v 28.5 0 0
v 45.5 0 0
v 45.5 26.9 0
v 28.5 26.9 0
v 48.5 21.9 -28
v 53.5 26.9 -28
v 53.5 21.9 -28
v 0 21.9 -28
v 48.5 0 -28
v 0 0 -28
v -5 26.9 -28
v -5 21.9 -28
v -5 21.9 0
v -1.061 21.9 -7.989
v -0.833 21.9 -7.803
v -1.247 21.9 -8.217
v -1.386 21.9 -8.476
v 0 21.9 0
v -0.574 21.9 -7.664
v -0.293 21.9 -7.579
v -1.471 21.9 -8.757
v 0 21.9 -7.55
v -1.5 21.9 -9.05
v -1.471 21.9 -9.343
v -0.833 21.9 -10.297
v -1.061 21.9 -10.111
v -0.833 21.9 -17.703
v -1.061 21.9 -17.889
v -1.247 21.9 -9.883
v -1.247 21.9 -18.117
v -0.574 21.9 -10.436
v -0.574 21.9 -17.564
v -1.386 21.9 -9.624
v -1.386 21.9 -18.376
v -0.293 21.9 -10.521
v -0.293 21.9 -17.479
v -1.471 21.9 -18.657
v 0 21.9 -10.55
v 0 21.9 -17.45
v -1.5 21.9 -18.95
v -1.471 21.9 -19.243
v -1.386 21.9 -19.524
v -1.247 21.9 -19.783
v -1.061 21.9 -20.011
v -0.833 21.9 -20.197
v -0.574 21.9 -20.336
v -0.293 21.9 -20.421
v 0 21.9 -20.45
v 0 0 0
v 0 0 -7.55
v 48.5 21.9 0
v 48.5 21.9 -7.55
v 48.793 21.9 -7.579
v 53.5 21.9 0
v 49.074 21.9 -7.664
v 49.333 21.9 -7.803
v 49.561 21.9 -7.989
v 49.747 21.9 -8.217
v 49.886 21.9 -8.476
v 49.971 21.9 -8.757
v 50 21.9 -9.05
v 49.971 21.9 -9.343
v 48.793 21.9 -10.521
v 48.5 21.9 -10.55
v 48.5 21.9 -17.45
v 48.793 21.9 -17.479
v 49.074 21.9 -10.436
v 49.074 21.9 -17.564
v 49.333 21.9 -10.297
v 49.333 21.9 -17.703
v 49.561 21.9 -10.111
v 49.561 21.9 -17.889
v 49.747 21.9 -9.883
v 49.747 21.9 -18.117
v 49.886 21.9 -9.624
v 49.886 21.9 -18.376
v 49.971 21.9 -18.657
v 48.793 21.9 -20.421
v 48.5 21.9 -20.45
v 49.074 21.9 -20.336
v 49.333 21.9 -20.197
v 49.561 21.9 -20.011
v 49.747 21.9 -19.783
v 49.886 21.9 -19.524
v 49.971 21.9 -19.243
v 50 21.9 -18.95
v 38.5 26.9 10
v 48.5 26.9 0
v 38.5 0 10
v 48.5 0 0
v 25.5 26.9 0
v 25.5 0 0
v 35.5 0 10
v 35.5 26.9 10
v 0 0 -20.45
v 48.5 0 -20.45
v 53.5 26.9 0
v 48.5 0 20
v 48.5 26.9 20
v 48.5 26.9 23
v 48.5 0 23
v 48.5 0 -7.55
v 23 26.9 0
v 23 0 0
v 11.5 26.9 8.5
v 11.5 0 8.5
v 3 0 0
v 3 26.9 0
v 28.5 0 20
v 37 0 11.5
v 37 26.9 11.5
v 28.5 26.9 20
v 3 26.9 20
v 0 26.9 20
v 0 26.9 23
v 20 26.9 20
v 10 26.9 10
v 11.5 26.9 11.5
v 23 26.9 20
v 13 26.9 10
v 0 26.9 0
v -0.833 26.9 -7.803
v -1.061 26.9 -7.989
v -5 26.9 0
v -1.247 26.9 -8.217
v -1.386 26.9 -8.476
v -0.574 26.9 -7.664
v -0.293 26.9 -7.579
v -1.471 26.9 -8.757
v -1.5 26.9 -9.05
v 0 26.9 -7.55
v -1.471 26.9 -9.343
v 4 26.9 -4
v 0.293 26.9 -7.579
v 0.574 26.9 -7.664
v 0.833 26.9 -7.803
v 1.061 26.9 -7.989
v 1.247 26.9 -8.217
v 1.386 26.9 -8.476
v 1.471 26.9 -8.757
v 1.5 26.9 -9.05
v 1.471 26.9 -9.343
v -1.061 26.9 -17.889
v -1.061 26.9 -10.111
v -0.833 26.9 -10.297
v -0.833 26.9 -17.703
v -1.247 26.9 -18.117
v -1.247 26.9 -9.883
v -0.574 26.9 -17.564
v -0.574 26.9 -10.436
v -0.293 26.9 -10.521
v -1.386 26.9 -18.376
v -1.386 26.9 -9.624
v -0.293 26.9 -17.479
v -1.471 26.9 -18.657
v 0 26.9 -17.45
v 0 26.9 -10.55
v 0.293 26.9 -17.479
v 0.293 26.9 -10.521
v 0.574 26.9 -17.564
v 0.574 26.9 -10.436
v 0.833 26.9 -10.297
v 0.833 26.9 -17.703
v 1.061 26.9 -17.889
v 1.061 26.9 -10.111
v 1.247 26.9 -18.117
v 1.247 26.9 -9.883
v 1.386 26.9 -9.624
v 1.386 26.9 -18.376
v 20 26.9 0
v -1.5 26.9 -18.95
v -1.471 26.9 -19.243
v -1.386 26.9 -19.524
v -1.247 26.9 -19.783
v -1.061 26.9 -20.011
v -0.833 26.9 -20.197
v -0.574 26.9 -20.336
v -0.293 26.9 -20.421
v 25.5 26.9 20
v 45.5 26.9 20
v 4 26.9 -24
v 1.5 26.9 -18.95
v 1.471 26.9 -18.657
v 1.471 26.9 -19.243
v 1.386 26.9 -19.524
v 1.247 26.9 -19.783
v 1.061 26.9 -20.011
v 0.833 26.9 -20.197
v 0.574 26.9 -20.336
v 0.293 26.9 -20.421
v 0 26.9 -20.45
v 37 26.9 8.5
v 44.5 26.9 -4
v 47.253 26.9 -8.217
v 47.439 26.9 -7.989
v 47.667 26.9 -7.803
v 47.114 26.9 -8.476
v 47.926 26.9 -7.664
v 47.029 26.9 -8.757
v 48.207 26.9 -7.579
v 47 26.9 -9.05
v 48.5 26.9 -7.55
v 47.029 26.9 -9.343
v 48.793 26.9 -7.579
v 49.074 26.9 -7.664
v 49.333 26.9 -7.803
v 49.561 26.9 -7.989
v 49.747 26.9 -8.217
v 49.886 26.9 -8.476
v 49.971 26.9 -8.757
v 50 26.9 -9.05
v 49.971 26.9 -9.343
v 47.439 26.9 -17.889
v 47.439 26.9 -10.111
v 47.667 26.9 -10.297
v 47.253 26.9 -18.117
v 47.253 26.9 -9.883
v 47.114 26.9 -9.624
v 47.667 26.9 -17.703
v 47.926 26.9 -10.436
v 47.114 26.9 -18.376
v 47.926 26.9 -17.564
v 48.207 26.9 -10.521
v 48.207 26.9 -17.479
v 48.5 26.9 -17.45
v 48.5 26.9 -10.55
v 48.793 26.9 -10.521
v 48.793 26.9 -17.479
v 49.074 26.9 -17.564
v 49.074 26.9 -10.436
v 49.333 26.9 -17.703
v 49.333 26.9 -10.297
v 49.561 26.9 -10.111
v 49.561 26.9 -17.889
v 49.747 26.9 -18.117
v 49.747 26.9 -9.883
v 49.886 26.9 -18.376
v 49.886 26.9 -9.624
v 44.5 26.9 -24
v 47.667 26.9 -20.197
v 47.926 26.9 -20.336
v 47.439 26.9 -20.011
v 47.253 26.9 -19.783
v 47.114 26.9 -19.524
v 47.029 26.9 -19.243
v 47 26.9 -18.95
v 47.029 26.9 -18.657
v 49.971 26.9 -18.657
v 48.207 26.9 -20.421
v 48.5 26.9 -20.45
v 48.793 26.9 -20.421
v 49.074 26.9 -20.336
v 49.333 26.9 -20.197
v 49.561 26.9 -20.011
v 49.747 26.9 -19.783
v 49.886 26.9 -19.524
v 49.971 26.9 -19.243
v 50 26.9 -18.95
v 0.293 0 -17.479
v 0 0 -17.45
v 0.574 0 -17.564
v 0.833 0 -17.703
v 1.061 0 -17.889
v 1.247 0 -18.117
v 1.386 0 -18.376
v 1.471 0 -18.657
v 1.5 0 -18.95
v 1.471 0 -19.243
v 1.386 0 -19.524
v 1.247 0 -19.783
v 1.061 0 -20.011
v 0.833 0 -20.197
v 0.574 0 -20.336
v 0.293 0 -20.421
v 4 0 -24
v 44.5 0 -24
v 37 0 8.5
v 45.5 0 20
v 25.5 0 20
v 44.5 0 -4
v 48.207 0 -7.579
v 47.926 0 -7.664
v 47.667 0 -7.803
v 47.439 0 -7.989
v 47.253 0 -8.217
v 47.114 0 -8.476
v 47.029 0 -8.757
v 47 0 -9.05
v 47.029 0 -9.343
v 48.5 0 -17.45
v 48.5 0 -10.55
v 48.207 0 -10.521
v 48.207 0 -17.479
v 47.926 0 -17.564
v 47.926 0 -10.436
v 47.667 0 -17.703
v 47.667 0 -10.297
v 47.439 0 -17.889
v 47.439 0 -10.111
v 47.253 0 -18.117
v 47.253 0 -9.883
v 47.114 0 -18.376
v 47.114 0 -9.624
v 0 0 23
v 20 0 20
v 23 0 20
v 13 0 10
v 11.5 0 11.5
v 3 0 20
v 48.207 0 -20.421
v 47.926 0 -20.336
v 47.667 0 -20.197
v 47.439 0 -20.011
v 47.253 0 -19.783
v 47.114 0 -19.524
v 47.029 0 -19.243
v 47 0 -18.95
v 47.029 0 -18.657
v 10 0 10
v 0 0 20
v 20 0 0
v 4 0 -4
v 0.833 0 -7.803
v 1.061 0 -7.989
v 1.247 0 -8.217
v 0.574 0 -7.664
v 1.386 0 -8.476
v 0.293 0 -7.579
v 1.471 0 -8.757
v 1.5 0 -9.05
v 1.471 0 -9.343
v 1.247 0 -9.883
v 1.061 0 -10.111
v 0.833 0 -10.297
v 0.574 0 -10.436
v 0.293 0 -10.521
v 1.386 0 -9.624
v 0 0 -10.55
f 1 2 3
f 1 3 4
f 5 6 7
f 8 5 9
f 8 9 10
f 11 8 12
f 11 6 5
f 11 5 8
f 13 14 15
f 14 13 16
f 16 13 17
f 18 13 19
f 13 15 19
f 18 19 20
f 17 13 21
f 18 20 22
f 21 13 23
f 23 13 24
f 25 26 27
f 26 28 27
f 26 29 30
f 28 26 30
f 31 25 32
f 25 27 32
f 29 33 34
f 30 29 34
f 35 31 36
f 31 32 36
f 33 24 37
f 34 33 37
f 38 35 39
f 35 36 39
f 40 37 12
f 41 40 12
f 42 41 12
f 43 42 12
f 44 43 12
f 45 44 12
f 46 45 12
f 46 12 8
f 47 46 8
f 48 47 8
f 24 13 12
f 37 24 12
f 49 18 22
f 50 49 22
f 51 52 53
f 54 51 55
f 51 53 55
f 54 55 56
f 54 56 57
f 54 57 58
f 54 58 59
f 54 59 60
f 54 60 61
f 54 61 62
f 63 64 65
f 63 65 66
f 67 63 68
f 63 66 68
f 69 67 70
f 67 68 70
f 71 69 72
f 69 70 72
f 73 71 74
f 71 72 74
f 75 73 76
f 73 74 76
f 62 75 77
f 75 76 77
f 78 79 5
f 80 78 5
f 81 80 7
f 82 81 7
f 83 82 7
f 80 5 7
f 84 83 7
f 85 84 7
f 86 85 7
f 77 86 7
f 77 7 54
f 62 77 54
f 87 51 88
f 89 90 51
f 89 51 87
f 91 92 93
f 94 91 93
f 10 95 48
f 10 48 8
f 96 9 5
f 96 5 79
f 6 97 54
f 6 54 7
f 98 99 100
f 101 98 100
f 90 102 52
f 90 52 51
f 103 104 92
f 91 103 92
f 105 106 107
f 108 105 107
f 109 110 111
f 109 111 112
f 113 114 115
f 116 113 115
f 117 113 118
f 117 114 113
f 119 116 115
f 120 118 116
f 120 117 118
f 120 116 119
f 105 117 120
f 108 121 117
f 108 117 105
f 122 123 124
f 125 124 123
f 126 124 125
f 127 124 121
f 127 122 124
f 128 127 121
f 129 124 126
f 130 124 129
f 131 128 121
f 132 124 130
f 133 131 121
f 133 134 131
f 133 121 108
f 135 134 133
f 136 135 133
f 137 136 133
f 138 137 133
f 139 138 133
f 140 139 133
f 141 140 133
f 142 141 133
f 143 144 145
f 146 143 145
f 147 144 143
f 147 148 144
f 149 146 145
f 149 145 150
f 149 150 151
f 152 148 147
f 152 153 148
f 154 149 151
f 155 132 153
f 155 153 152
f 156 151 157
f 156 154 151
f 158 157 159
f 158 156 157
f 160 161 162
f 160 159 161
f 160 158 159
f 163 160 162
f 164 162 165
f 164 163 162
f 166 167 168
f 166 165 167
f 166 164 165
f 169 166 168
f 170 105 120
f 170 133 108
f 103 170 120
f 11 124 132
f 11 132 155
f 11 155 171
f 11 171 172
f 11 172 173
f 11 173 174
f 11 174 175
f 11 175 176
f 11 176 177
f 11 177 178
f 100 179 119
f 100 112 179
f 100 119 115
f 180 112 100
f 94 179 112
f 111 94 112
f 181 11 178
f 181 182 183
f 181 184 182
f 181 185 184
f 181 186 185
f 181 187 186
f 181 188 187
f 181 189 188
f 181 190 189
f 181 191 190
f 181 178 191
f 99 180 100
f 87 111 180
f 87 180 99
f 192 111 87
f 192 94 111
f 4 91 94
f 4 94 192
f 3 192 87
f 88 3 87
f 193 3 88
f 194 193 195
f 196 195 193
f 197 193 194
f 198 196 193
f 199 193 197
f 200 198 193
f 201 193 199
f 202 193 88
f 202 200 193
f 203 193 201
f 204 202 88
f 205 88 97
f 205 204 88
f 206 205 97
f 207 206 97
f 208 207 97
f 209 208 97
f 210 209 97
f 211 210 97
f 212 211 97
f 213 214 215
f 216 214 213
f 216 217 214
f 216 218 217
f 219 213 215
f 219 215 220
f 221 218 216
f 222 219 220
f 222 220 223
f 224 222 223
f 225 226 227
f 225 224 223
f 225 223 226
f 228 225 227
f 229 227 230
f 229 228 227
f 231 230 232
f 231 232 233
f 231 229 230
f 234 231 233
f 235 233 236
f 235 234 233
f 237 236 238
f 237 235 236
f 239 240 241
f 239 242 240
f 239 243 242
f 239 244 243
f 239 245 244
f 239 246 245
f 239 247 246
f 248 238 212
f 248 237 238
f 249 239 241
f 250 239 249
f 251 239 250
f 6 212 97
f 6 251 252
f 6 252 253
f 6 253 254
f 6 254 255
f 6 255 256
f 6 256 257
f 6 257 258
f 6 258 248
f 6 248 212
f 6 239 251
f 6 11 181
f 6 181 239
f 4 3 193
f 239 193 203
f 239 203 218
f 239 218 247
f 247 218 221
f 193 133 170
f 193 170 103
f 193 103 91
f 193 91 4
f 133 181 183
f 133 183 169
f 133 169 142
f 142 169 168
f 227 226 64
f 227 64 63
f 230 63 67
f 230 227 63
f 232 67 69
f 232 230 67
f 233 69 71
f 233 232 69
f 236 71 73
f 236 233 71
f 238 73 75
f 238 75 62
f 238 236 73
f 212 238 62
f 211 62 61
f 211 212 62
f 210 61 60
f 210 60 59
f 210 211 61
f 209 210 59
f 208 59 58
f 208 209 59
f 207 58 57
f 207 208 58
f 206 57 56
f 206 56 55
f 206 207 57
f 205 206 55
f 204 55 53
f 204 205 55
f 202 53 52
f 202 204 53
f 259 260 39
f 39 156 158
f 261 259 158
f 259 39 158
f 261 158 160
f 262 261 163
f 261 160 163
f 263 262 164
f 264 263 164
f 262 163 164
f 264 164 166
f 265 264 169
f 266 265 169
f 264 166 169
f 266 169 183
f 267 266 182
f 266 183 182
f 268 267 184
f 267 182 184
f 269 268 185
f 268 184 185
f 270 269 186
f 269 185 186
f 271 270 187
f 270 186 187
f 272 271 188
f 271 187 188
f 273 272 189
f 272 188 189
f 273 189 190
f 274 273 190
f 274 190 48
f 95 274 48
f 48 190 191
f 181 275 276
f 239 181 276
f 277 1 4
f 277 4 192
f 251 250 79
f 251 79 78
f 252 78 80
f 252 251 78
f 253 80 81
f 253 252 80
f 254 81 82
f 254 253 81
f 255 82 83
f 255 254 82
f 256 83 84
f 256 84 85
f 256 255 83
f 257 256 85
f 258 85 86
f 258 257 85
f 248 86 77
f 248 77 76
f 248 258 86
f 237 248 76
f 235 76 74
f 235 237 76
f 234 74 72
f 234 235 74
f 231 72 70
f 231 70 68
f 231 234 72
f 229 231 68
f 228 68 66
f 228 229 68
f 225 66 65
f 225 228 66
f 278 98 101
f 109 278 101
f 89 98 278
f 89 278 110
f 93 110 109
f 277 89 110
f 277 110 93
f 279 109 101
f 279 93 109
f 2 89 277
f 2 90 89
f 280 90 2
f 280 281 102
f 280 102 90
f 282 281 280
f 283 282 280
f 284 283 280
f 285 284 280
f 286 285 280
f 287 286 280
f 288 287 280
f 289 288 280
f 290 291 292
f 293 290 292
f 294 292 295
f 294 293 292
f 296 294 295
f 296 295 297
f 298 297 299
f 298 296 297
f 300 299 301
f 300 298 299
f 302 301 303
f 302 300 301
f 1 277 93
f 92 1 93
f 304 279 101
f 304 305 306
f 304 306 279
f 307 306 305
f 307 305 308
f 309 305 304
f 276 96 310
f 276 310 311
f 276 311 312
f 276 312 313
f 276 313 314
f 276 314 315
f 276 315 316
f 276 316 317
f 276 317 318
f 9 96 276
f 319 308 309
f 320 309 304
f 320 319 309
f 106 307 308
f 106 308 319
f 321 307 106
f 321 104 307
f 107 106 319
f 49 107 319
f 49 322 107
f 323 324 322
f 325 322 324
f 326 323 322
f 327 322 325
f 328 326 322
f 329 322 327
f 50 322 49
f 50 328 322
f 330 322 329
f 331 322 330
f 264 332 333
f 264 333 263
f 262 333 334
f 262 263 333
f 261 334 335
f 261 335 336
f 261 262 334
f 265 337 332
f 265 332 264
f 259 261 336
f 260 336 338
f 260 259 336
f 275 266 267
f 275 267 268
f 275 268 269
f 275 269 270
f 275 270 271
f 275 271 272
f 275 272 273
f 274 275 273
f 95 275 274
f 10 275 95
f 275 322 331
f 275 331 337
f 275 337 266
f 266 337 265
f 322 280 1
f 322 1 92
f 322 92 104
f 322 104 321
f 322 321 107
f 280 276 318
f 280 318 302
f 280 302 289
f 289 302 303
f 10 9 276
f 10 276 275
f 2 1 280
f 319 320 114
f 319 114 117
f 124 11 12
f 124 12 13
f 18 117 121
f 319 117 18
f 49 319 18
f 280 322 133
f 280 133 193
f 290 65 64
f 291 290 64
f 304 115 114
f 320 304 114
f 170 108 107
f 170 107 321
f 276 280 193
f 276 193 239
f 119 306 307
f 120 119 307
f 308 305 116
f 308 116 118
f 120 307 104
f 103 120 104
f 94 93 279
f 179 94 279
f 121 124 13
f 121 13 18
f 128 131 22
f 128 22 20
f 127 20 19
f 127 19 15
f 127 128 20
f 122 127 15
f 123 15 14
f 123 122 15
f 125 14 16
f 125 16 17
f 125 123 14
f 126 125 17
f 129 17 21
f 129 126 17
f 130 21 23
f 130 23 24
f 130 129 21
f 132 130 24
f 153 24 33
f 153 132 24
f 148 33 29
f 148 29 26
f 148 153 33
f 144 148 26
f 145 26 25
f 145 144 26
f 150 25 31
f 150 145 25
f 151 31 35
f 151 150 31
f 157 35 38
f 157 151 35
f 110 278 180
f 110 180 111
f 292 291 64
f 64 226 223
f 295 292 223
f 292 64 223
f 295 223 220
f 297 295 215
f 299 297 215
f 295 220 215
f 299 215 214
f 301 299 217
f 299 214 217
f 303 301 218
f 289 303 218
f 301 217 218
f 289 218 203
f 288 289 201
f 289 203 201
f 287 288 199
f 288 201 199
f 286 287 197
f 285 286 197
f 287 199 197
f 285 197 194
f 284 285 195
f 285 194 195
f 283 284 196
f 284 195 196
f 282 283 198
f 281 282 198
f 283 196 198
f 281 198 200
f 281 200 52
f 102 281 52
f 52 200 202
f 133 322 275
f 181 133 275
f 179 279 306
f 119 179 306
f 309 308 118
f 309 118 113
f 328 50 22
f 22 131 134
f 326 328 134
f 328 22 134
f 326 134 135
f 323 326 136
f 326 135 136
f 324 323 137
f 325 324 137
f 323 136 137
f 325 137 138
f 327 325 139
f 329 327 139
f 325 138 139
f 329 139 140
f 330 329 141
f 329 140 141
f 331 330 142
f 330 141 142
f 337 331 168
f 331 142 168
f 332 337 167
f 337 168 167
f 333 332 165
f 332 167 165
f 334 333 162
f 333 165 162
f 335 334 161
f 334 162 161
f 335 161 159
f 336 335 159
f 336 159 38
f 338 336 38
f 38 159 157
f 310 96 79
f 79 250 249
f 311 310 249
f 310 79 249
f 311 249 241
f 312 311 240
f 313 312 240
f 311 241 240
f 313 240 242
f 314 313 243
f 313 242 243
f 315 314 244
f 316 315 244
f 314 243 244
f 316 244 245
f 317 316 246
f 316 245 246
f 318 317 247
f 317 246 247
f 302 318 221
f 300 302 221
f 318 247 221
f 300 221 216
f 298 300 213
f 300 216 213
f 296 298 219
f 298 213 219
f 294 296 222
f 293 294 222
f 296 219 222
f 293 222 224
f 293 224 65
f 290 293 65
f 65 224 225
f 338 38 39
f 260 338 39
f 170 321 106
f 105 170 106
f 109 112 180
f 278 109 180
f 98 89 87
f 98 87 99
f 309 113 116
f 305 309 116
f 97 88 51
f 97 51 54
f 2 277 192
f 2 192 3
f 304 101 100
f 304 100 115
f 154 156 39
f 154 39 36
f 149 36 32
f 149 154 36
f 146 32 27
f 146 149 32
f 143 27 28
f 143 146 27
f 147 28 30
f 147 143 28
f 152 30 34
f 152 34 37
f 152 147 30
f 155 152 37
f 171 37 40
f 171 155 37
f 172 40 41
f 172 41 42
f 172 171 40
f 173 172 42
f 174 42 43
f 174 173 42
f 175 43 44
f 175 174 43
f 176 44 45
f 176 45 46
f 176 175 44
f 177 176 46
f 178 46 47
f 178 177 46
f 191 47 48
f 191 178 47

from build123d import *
from build123d.topology import SkipClean

# Parameters (mm, degrees)
SKETCH1_W           = 40.5
SKETCH1_H           = 20
BOSS_EXTRUDE1_DEPTH = 26.9
BOSS_EXTRUDE2_DEPTH = 5
SKETCH3_R           = 1.5
CUT_EXTRUDE1_DEPTH  = 67.10491661


with BuildPart() as part:
    # Sketch1 → Boss-Extrude1 (new body)
    with BuildSketch(Plane(origin=(0, 0, 0), x_dir=(1, 0, 0), z_dir=(0, 1, 0))):
        Polygon((0, 0), (0, 28), (48.5, 28), (48.5, 0), (38.5, -10), (48.5, -20), (48.5, -23), (0, -23), (0, -20), (10, -10), align=None)
        with Locations((24.25, 14)):
            Rectangle(SKETCH1_W, SKETCH1_H, mode=Mode.SUBTRACT)
        Polygon((3, 0), (20, 0), (11.5, -8.5), align=None, mode=Mode.SUBTRACT)
        Polygon((13, -10), (23, 0), (25.5, 0), (35.5, -10), (25.5, -20), (23, -20), align=None, mode=Mode.SUBTRACT)
        Polygon((11.5, -11.5), (3, -20), (20, -20), align=None, mode=Mode.SUBTRACT)
        Polygon((45.5, 0), (28.5, 0), (37, -8.5), align=None, mode=Mode.SUBTRACT)
        Polygon((37, -11.5), (28.5, -20), (45.5, -20), align=None, mode=Mode.SUBTRACT)
    extrude(amount=BOSS_EXTRUDE1_DEPTH)

    # Sketch2 → Boss-Extrude2 (add)
    with BuildSketch(Plane(origin=(0, 26.9, 0), x_dir=(1, 0, 0), z_dir=(0, 1, 0))):
        with BuildLine():
            Line((-5, 0), (0, 0))
            Line((0, 0), (0, 7.55))
            ThreePointArc((0, 7.55), (-1.5, 9.05), (0, 10.55))
            Line((0, 10.55), (0, 17.45))
            ThreePointArc((0, 17.45), (-1.5, 18.95), (0, 20.45))
            Line((0, 20.45), (0, 28))
            Line((0, 28), (-5, 28))
            Line((-5, 28), (-5, 0))
        make_face()
        with BuildLine():
            Line((53.5, 28), (48.5, 28))
            Line((48.5, 28), (48.5, 20.45))
            ThreePointArc((48.5, 20.45), (50, 18.95), (48.5, 17.45))
            Line((48.5, 17.45), (48.5, 10.55))
            ThreePointArc((48.5, 10.55), (50, 9.05), (48.5, 7.55))
            Line((48.5, 7.55), (48.5, 0))
            Line((48.5, 0), (53.5, 0))
            Line((53.5, 0), (53.5, 28))
        make_face()
    extrude(amount=-BOSS_EXTRUDE2_DEPTH)

    # Sketch3 → Cut-Extrude1 (cut, through all)
    with SkipClean():  # the faces are left unmerged after this step: merging them gives an invalid solid
        with BuildSketch(Plane(origin=(0, 26.9, 0), x_dir=(1, 0, 0), z_dir=(0, 1, 0))):
            with Locations(Location((0, 18.95, 0), (0, 0, 270))):
                Circle(SKETCH3_R)
            with Locations(Location((0, 9.05, 0), (0, 0, 270))):
                Circle(SKETCH3_R)
            with Locations(Location((48.5, 9.05, 0), (0, 0, 270))):
                Circle(SKETCH3_R)
            with Locations(Location((48.5, 18.95, 0), (0, 0, 270))):
                Circle(SKETCH3_R)
        extrude(amount=-CUT_EXTRUDE1_DEPTH, mode=Mode.SUBTRACT)


solid = part.part
